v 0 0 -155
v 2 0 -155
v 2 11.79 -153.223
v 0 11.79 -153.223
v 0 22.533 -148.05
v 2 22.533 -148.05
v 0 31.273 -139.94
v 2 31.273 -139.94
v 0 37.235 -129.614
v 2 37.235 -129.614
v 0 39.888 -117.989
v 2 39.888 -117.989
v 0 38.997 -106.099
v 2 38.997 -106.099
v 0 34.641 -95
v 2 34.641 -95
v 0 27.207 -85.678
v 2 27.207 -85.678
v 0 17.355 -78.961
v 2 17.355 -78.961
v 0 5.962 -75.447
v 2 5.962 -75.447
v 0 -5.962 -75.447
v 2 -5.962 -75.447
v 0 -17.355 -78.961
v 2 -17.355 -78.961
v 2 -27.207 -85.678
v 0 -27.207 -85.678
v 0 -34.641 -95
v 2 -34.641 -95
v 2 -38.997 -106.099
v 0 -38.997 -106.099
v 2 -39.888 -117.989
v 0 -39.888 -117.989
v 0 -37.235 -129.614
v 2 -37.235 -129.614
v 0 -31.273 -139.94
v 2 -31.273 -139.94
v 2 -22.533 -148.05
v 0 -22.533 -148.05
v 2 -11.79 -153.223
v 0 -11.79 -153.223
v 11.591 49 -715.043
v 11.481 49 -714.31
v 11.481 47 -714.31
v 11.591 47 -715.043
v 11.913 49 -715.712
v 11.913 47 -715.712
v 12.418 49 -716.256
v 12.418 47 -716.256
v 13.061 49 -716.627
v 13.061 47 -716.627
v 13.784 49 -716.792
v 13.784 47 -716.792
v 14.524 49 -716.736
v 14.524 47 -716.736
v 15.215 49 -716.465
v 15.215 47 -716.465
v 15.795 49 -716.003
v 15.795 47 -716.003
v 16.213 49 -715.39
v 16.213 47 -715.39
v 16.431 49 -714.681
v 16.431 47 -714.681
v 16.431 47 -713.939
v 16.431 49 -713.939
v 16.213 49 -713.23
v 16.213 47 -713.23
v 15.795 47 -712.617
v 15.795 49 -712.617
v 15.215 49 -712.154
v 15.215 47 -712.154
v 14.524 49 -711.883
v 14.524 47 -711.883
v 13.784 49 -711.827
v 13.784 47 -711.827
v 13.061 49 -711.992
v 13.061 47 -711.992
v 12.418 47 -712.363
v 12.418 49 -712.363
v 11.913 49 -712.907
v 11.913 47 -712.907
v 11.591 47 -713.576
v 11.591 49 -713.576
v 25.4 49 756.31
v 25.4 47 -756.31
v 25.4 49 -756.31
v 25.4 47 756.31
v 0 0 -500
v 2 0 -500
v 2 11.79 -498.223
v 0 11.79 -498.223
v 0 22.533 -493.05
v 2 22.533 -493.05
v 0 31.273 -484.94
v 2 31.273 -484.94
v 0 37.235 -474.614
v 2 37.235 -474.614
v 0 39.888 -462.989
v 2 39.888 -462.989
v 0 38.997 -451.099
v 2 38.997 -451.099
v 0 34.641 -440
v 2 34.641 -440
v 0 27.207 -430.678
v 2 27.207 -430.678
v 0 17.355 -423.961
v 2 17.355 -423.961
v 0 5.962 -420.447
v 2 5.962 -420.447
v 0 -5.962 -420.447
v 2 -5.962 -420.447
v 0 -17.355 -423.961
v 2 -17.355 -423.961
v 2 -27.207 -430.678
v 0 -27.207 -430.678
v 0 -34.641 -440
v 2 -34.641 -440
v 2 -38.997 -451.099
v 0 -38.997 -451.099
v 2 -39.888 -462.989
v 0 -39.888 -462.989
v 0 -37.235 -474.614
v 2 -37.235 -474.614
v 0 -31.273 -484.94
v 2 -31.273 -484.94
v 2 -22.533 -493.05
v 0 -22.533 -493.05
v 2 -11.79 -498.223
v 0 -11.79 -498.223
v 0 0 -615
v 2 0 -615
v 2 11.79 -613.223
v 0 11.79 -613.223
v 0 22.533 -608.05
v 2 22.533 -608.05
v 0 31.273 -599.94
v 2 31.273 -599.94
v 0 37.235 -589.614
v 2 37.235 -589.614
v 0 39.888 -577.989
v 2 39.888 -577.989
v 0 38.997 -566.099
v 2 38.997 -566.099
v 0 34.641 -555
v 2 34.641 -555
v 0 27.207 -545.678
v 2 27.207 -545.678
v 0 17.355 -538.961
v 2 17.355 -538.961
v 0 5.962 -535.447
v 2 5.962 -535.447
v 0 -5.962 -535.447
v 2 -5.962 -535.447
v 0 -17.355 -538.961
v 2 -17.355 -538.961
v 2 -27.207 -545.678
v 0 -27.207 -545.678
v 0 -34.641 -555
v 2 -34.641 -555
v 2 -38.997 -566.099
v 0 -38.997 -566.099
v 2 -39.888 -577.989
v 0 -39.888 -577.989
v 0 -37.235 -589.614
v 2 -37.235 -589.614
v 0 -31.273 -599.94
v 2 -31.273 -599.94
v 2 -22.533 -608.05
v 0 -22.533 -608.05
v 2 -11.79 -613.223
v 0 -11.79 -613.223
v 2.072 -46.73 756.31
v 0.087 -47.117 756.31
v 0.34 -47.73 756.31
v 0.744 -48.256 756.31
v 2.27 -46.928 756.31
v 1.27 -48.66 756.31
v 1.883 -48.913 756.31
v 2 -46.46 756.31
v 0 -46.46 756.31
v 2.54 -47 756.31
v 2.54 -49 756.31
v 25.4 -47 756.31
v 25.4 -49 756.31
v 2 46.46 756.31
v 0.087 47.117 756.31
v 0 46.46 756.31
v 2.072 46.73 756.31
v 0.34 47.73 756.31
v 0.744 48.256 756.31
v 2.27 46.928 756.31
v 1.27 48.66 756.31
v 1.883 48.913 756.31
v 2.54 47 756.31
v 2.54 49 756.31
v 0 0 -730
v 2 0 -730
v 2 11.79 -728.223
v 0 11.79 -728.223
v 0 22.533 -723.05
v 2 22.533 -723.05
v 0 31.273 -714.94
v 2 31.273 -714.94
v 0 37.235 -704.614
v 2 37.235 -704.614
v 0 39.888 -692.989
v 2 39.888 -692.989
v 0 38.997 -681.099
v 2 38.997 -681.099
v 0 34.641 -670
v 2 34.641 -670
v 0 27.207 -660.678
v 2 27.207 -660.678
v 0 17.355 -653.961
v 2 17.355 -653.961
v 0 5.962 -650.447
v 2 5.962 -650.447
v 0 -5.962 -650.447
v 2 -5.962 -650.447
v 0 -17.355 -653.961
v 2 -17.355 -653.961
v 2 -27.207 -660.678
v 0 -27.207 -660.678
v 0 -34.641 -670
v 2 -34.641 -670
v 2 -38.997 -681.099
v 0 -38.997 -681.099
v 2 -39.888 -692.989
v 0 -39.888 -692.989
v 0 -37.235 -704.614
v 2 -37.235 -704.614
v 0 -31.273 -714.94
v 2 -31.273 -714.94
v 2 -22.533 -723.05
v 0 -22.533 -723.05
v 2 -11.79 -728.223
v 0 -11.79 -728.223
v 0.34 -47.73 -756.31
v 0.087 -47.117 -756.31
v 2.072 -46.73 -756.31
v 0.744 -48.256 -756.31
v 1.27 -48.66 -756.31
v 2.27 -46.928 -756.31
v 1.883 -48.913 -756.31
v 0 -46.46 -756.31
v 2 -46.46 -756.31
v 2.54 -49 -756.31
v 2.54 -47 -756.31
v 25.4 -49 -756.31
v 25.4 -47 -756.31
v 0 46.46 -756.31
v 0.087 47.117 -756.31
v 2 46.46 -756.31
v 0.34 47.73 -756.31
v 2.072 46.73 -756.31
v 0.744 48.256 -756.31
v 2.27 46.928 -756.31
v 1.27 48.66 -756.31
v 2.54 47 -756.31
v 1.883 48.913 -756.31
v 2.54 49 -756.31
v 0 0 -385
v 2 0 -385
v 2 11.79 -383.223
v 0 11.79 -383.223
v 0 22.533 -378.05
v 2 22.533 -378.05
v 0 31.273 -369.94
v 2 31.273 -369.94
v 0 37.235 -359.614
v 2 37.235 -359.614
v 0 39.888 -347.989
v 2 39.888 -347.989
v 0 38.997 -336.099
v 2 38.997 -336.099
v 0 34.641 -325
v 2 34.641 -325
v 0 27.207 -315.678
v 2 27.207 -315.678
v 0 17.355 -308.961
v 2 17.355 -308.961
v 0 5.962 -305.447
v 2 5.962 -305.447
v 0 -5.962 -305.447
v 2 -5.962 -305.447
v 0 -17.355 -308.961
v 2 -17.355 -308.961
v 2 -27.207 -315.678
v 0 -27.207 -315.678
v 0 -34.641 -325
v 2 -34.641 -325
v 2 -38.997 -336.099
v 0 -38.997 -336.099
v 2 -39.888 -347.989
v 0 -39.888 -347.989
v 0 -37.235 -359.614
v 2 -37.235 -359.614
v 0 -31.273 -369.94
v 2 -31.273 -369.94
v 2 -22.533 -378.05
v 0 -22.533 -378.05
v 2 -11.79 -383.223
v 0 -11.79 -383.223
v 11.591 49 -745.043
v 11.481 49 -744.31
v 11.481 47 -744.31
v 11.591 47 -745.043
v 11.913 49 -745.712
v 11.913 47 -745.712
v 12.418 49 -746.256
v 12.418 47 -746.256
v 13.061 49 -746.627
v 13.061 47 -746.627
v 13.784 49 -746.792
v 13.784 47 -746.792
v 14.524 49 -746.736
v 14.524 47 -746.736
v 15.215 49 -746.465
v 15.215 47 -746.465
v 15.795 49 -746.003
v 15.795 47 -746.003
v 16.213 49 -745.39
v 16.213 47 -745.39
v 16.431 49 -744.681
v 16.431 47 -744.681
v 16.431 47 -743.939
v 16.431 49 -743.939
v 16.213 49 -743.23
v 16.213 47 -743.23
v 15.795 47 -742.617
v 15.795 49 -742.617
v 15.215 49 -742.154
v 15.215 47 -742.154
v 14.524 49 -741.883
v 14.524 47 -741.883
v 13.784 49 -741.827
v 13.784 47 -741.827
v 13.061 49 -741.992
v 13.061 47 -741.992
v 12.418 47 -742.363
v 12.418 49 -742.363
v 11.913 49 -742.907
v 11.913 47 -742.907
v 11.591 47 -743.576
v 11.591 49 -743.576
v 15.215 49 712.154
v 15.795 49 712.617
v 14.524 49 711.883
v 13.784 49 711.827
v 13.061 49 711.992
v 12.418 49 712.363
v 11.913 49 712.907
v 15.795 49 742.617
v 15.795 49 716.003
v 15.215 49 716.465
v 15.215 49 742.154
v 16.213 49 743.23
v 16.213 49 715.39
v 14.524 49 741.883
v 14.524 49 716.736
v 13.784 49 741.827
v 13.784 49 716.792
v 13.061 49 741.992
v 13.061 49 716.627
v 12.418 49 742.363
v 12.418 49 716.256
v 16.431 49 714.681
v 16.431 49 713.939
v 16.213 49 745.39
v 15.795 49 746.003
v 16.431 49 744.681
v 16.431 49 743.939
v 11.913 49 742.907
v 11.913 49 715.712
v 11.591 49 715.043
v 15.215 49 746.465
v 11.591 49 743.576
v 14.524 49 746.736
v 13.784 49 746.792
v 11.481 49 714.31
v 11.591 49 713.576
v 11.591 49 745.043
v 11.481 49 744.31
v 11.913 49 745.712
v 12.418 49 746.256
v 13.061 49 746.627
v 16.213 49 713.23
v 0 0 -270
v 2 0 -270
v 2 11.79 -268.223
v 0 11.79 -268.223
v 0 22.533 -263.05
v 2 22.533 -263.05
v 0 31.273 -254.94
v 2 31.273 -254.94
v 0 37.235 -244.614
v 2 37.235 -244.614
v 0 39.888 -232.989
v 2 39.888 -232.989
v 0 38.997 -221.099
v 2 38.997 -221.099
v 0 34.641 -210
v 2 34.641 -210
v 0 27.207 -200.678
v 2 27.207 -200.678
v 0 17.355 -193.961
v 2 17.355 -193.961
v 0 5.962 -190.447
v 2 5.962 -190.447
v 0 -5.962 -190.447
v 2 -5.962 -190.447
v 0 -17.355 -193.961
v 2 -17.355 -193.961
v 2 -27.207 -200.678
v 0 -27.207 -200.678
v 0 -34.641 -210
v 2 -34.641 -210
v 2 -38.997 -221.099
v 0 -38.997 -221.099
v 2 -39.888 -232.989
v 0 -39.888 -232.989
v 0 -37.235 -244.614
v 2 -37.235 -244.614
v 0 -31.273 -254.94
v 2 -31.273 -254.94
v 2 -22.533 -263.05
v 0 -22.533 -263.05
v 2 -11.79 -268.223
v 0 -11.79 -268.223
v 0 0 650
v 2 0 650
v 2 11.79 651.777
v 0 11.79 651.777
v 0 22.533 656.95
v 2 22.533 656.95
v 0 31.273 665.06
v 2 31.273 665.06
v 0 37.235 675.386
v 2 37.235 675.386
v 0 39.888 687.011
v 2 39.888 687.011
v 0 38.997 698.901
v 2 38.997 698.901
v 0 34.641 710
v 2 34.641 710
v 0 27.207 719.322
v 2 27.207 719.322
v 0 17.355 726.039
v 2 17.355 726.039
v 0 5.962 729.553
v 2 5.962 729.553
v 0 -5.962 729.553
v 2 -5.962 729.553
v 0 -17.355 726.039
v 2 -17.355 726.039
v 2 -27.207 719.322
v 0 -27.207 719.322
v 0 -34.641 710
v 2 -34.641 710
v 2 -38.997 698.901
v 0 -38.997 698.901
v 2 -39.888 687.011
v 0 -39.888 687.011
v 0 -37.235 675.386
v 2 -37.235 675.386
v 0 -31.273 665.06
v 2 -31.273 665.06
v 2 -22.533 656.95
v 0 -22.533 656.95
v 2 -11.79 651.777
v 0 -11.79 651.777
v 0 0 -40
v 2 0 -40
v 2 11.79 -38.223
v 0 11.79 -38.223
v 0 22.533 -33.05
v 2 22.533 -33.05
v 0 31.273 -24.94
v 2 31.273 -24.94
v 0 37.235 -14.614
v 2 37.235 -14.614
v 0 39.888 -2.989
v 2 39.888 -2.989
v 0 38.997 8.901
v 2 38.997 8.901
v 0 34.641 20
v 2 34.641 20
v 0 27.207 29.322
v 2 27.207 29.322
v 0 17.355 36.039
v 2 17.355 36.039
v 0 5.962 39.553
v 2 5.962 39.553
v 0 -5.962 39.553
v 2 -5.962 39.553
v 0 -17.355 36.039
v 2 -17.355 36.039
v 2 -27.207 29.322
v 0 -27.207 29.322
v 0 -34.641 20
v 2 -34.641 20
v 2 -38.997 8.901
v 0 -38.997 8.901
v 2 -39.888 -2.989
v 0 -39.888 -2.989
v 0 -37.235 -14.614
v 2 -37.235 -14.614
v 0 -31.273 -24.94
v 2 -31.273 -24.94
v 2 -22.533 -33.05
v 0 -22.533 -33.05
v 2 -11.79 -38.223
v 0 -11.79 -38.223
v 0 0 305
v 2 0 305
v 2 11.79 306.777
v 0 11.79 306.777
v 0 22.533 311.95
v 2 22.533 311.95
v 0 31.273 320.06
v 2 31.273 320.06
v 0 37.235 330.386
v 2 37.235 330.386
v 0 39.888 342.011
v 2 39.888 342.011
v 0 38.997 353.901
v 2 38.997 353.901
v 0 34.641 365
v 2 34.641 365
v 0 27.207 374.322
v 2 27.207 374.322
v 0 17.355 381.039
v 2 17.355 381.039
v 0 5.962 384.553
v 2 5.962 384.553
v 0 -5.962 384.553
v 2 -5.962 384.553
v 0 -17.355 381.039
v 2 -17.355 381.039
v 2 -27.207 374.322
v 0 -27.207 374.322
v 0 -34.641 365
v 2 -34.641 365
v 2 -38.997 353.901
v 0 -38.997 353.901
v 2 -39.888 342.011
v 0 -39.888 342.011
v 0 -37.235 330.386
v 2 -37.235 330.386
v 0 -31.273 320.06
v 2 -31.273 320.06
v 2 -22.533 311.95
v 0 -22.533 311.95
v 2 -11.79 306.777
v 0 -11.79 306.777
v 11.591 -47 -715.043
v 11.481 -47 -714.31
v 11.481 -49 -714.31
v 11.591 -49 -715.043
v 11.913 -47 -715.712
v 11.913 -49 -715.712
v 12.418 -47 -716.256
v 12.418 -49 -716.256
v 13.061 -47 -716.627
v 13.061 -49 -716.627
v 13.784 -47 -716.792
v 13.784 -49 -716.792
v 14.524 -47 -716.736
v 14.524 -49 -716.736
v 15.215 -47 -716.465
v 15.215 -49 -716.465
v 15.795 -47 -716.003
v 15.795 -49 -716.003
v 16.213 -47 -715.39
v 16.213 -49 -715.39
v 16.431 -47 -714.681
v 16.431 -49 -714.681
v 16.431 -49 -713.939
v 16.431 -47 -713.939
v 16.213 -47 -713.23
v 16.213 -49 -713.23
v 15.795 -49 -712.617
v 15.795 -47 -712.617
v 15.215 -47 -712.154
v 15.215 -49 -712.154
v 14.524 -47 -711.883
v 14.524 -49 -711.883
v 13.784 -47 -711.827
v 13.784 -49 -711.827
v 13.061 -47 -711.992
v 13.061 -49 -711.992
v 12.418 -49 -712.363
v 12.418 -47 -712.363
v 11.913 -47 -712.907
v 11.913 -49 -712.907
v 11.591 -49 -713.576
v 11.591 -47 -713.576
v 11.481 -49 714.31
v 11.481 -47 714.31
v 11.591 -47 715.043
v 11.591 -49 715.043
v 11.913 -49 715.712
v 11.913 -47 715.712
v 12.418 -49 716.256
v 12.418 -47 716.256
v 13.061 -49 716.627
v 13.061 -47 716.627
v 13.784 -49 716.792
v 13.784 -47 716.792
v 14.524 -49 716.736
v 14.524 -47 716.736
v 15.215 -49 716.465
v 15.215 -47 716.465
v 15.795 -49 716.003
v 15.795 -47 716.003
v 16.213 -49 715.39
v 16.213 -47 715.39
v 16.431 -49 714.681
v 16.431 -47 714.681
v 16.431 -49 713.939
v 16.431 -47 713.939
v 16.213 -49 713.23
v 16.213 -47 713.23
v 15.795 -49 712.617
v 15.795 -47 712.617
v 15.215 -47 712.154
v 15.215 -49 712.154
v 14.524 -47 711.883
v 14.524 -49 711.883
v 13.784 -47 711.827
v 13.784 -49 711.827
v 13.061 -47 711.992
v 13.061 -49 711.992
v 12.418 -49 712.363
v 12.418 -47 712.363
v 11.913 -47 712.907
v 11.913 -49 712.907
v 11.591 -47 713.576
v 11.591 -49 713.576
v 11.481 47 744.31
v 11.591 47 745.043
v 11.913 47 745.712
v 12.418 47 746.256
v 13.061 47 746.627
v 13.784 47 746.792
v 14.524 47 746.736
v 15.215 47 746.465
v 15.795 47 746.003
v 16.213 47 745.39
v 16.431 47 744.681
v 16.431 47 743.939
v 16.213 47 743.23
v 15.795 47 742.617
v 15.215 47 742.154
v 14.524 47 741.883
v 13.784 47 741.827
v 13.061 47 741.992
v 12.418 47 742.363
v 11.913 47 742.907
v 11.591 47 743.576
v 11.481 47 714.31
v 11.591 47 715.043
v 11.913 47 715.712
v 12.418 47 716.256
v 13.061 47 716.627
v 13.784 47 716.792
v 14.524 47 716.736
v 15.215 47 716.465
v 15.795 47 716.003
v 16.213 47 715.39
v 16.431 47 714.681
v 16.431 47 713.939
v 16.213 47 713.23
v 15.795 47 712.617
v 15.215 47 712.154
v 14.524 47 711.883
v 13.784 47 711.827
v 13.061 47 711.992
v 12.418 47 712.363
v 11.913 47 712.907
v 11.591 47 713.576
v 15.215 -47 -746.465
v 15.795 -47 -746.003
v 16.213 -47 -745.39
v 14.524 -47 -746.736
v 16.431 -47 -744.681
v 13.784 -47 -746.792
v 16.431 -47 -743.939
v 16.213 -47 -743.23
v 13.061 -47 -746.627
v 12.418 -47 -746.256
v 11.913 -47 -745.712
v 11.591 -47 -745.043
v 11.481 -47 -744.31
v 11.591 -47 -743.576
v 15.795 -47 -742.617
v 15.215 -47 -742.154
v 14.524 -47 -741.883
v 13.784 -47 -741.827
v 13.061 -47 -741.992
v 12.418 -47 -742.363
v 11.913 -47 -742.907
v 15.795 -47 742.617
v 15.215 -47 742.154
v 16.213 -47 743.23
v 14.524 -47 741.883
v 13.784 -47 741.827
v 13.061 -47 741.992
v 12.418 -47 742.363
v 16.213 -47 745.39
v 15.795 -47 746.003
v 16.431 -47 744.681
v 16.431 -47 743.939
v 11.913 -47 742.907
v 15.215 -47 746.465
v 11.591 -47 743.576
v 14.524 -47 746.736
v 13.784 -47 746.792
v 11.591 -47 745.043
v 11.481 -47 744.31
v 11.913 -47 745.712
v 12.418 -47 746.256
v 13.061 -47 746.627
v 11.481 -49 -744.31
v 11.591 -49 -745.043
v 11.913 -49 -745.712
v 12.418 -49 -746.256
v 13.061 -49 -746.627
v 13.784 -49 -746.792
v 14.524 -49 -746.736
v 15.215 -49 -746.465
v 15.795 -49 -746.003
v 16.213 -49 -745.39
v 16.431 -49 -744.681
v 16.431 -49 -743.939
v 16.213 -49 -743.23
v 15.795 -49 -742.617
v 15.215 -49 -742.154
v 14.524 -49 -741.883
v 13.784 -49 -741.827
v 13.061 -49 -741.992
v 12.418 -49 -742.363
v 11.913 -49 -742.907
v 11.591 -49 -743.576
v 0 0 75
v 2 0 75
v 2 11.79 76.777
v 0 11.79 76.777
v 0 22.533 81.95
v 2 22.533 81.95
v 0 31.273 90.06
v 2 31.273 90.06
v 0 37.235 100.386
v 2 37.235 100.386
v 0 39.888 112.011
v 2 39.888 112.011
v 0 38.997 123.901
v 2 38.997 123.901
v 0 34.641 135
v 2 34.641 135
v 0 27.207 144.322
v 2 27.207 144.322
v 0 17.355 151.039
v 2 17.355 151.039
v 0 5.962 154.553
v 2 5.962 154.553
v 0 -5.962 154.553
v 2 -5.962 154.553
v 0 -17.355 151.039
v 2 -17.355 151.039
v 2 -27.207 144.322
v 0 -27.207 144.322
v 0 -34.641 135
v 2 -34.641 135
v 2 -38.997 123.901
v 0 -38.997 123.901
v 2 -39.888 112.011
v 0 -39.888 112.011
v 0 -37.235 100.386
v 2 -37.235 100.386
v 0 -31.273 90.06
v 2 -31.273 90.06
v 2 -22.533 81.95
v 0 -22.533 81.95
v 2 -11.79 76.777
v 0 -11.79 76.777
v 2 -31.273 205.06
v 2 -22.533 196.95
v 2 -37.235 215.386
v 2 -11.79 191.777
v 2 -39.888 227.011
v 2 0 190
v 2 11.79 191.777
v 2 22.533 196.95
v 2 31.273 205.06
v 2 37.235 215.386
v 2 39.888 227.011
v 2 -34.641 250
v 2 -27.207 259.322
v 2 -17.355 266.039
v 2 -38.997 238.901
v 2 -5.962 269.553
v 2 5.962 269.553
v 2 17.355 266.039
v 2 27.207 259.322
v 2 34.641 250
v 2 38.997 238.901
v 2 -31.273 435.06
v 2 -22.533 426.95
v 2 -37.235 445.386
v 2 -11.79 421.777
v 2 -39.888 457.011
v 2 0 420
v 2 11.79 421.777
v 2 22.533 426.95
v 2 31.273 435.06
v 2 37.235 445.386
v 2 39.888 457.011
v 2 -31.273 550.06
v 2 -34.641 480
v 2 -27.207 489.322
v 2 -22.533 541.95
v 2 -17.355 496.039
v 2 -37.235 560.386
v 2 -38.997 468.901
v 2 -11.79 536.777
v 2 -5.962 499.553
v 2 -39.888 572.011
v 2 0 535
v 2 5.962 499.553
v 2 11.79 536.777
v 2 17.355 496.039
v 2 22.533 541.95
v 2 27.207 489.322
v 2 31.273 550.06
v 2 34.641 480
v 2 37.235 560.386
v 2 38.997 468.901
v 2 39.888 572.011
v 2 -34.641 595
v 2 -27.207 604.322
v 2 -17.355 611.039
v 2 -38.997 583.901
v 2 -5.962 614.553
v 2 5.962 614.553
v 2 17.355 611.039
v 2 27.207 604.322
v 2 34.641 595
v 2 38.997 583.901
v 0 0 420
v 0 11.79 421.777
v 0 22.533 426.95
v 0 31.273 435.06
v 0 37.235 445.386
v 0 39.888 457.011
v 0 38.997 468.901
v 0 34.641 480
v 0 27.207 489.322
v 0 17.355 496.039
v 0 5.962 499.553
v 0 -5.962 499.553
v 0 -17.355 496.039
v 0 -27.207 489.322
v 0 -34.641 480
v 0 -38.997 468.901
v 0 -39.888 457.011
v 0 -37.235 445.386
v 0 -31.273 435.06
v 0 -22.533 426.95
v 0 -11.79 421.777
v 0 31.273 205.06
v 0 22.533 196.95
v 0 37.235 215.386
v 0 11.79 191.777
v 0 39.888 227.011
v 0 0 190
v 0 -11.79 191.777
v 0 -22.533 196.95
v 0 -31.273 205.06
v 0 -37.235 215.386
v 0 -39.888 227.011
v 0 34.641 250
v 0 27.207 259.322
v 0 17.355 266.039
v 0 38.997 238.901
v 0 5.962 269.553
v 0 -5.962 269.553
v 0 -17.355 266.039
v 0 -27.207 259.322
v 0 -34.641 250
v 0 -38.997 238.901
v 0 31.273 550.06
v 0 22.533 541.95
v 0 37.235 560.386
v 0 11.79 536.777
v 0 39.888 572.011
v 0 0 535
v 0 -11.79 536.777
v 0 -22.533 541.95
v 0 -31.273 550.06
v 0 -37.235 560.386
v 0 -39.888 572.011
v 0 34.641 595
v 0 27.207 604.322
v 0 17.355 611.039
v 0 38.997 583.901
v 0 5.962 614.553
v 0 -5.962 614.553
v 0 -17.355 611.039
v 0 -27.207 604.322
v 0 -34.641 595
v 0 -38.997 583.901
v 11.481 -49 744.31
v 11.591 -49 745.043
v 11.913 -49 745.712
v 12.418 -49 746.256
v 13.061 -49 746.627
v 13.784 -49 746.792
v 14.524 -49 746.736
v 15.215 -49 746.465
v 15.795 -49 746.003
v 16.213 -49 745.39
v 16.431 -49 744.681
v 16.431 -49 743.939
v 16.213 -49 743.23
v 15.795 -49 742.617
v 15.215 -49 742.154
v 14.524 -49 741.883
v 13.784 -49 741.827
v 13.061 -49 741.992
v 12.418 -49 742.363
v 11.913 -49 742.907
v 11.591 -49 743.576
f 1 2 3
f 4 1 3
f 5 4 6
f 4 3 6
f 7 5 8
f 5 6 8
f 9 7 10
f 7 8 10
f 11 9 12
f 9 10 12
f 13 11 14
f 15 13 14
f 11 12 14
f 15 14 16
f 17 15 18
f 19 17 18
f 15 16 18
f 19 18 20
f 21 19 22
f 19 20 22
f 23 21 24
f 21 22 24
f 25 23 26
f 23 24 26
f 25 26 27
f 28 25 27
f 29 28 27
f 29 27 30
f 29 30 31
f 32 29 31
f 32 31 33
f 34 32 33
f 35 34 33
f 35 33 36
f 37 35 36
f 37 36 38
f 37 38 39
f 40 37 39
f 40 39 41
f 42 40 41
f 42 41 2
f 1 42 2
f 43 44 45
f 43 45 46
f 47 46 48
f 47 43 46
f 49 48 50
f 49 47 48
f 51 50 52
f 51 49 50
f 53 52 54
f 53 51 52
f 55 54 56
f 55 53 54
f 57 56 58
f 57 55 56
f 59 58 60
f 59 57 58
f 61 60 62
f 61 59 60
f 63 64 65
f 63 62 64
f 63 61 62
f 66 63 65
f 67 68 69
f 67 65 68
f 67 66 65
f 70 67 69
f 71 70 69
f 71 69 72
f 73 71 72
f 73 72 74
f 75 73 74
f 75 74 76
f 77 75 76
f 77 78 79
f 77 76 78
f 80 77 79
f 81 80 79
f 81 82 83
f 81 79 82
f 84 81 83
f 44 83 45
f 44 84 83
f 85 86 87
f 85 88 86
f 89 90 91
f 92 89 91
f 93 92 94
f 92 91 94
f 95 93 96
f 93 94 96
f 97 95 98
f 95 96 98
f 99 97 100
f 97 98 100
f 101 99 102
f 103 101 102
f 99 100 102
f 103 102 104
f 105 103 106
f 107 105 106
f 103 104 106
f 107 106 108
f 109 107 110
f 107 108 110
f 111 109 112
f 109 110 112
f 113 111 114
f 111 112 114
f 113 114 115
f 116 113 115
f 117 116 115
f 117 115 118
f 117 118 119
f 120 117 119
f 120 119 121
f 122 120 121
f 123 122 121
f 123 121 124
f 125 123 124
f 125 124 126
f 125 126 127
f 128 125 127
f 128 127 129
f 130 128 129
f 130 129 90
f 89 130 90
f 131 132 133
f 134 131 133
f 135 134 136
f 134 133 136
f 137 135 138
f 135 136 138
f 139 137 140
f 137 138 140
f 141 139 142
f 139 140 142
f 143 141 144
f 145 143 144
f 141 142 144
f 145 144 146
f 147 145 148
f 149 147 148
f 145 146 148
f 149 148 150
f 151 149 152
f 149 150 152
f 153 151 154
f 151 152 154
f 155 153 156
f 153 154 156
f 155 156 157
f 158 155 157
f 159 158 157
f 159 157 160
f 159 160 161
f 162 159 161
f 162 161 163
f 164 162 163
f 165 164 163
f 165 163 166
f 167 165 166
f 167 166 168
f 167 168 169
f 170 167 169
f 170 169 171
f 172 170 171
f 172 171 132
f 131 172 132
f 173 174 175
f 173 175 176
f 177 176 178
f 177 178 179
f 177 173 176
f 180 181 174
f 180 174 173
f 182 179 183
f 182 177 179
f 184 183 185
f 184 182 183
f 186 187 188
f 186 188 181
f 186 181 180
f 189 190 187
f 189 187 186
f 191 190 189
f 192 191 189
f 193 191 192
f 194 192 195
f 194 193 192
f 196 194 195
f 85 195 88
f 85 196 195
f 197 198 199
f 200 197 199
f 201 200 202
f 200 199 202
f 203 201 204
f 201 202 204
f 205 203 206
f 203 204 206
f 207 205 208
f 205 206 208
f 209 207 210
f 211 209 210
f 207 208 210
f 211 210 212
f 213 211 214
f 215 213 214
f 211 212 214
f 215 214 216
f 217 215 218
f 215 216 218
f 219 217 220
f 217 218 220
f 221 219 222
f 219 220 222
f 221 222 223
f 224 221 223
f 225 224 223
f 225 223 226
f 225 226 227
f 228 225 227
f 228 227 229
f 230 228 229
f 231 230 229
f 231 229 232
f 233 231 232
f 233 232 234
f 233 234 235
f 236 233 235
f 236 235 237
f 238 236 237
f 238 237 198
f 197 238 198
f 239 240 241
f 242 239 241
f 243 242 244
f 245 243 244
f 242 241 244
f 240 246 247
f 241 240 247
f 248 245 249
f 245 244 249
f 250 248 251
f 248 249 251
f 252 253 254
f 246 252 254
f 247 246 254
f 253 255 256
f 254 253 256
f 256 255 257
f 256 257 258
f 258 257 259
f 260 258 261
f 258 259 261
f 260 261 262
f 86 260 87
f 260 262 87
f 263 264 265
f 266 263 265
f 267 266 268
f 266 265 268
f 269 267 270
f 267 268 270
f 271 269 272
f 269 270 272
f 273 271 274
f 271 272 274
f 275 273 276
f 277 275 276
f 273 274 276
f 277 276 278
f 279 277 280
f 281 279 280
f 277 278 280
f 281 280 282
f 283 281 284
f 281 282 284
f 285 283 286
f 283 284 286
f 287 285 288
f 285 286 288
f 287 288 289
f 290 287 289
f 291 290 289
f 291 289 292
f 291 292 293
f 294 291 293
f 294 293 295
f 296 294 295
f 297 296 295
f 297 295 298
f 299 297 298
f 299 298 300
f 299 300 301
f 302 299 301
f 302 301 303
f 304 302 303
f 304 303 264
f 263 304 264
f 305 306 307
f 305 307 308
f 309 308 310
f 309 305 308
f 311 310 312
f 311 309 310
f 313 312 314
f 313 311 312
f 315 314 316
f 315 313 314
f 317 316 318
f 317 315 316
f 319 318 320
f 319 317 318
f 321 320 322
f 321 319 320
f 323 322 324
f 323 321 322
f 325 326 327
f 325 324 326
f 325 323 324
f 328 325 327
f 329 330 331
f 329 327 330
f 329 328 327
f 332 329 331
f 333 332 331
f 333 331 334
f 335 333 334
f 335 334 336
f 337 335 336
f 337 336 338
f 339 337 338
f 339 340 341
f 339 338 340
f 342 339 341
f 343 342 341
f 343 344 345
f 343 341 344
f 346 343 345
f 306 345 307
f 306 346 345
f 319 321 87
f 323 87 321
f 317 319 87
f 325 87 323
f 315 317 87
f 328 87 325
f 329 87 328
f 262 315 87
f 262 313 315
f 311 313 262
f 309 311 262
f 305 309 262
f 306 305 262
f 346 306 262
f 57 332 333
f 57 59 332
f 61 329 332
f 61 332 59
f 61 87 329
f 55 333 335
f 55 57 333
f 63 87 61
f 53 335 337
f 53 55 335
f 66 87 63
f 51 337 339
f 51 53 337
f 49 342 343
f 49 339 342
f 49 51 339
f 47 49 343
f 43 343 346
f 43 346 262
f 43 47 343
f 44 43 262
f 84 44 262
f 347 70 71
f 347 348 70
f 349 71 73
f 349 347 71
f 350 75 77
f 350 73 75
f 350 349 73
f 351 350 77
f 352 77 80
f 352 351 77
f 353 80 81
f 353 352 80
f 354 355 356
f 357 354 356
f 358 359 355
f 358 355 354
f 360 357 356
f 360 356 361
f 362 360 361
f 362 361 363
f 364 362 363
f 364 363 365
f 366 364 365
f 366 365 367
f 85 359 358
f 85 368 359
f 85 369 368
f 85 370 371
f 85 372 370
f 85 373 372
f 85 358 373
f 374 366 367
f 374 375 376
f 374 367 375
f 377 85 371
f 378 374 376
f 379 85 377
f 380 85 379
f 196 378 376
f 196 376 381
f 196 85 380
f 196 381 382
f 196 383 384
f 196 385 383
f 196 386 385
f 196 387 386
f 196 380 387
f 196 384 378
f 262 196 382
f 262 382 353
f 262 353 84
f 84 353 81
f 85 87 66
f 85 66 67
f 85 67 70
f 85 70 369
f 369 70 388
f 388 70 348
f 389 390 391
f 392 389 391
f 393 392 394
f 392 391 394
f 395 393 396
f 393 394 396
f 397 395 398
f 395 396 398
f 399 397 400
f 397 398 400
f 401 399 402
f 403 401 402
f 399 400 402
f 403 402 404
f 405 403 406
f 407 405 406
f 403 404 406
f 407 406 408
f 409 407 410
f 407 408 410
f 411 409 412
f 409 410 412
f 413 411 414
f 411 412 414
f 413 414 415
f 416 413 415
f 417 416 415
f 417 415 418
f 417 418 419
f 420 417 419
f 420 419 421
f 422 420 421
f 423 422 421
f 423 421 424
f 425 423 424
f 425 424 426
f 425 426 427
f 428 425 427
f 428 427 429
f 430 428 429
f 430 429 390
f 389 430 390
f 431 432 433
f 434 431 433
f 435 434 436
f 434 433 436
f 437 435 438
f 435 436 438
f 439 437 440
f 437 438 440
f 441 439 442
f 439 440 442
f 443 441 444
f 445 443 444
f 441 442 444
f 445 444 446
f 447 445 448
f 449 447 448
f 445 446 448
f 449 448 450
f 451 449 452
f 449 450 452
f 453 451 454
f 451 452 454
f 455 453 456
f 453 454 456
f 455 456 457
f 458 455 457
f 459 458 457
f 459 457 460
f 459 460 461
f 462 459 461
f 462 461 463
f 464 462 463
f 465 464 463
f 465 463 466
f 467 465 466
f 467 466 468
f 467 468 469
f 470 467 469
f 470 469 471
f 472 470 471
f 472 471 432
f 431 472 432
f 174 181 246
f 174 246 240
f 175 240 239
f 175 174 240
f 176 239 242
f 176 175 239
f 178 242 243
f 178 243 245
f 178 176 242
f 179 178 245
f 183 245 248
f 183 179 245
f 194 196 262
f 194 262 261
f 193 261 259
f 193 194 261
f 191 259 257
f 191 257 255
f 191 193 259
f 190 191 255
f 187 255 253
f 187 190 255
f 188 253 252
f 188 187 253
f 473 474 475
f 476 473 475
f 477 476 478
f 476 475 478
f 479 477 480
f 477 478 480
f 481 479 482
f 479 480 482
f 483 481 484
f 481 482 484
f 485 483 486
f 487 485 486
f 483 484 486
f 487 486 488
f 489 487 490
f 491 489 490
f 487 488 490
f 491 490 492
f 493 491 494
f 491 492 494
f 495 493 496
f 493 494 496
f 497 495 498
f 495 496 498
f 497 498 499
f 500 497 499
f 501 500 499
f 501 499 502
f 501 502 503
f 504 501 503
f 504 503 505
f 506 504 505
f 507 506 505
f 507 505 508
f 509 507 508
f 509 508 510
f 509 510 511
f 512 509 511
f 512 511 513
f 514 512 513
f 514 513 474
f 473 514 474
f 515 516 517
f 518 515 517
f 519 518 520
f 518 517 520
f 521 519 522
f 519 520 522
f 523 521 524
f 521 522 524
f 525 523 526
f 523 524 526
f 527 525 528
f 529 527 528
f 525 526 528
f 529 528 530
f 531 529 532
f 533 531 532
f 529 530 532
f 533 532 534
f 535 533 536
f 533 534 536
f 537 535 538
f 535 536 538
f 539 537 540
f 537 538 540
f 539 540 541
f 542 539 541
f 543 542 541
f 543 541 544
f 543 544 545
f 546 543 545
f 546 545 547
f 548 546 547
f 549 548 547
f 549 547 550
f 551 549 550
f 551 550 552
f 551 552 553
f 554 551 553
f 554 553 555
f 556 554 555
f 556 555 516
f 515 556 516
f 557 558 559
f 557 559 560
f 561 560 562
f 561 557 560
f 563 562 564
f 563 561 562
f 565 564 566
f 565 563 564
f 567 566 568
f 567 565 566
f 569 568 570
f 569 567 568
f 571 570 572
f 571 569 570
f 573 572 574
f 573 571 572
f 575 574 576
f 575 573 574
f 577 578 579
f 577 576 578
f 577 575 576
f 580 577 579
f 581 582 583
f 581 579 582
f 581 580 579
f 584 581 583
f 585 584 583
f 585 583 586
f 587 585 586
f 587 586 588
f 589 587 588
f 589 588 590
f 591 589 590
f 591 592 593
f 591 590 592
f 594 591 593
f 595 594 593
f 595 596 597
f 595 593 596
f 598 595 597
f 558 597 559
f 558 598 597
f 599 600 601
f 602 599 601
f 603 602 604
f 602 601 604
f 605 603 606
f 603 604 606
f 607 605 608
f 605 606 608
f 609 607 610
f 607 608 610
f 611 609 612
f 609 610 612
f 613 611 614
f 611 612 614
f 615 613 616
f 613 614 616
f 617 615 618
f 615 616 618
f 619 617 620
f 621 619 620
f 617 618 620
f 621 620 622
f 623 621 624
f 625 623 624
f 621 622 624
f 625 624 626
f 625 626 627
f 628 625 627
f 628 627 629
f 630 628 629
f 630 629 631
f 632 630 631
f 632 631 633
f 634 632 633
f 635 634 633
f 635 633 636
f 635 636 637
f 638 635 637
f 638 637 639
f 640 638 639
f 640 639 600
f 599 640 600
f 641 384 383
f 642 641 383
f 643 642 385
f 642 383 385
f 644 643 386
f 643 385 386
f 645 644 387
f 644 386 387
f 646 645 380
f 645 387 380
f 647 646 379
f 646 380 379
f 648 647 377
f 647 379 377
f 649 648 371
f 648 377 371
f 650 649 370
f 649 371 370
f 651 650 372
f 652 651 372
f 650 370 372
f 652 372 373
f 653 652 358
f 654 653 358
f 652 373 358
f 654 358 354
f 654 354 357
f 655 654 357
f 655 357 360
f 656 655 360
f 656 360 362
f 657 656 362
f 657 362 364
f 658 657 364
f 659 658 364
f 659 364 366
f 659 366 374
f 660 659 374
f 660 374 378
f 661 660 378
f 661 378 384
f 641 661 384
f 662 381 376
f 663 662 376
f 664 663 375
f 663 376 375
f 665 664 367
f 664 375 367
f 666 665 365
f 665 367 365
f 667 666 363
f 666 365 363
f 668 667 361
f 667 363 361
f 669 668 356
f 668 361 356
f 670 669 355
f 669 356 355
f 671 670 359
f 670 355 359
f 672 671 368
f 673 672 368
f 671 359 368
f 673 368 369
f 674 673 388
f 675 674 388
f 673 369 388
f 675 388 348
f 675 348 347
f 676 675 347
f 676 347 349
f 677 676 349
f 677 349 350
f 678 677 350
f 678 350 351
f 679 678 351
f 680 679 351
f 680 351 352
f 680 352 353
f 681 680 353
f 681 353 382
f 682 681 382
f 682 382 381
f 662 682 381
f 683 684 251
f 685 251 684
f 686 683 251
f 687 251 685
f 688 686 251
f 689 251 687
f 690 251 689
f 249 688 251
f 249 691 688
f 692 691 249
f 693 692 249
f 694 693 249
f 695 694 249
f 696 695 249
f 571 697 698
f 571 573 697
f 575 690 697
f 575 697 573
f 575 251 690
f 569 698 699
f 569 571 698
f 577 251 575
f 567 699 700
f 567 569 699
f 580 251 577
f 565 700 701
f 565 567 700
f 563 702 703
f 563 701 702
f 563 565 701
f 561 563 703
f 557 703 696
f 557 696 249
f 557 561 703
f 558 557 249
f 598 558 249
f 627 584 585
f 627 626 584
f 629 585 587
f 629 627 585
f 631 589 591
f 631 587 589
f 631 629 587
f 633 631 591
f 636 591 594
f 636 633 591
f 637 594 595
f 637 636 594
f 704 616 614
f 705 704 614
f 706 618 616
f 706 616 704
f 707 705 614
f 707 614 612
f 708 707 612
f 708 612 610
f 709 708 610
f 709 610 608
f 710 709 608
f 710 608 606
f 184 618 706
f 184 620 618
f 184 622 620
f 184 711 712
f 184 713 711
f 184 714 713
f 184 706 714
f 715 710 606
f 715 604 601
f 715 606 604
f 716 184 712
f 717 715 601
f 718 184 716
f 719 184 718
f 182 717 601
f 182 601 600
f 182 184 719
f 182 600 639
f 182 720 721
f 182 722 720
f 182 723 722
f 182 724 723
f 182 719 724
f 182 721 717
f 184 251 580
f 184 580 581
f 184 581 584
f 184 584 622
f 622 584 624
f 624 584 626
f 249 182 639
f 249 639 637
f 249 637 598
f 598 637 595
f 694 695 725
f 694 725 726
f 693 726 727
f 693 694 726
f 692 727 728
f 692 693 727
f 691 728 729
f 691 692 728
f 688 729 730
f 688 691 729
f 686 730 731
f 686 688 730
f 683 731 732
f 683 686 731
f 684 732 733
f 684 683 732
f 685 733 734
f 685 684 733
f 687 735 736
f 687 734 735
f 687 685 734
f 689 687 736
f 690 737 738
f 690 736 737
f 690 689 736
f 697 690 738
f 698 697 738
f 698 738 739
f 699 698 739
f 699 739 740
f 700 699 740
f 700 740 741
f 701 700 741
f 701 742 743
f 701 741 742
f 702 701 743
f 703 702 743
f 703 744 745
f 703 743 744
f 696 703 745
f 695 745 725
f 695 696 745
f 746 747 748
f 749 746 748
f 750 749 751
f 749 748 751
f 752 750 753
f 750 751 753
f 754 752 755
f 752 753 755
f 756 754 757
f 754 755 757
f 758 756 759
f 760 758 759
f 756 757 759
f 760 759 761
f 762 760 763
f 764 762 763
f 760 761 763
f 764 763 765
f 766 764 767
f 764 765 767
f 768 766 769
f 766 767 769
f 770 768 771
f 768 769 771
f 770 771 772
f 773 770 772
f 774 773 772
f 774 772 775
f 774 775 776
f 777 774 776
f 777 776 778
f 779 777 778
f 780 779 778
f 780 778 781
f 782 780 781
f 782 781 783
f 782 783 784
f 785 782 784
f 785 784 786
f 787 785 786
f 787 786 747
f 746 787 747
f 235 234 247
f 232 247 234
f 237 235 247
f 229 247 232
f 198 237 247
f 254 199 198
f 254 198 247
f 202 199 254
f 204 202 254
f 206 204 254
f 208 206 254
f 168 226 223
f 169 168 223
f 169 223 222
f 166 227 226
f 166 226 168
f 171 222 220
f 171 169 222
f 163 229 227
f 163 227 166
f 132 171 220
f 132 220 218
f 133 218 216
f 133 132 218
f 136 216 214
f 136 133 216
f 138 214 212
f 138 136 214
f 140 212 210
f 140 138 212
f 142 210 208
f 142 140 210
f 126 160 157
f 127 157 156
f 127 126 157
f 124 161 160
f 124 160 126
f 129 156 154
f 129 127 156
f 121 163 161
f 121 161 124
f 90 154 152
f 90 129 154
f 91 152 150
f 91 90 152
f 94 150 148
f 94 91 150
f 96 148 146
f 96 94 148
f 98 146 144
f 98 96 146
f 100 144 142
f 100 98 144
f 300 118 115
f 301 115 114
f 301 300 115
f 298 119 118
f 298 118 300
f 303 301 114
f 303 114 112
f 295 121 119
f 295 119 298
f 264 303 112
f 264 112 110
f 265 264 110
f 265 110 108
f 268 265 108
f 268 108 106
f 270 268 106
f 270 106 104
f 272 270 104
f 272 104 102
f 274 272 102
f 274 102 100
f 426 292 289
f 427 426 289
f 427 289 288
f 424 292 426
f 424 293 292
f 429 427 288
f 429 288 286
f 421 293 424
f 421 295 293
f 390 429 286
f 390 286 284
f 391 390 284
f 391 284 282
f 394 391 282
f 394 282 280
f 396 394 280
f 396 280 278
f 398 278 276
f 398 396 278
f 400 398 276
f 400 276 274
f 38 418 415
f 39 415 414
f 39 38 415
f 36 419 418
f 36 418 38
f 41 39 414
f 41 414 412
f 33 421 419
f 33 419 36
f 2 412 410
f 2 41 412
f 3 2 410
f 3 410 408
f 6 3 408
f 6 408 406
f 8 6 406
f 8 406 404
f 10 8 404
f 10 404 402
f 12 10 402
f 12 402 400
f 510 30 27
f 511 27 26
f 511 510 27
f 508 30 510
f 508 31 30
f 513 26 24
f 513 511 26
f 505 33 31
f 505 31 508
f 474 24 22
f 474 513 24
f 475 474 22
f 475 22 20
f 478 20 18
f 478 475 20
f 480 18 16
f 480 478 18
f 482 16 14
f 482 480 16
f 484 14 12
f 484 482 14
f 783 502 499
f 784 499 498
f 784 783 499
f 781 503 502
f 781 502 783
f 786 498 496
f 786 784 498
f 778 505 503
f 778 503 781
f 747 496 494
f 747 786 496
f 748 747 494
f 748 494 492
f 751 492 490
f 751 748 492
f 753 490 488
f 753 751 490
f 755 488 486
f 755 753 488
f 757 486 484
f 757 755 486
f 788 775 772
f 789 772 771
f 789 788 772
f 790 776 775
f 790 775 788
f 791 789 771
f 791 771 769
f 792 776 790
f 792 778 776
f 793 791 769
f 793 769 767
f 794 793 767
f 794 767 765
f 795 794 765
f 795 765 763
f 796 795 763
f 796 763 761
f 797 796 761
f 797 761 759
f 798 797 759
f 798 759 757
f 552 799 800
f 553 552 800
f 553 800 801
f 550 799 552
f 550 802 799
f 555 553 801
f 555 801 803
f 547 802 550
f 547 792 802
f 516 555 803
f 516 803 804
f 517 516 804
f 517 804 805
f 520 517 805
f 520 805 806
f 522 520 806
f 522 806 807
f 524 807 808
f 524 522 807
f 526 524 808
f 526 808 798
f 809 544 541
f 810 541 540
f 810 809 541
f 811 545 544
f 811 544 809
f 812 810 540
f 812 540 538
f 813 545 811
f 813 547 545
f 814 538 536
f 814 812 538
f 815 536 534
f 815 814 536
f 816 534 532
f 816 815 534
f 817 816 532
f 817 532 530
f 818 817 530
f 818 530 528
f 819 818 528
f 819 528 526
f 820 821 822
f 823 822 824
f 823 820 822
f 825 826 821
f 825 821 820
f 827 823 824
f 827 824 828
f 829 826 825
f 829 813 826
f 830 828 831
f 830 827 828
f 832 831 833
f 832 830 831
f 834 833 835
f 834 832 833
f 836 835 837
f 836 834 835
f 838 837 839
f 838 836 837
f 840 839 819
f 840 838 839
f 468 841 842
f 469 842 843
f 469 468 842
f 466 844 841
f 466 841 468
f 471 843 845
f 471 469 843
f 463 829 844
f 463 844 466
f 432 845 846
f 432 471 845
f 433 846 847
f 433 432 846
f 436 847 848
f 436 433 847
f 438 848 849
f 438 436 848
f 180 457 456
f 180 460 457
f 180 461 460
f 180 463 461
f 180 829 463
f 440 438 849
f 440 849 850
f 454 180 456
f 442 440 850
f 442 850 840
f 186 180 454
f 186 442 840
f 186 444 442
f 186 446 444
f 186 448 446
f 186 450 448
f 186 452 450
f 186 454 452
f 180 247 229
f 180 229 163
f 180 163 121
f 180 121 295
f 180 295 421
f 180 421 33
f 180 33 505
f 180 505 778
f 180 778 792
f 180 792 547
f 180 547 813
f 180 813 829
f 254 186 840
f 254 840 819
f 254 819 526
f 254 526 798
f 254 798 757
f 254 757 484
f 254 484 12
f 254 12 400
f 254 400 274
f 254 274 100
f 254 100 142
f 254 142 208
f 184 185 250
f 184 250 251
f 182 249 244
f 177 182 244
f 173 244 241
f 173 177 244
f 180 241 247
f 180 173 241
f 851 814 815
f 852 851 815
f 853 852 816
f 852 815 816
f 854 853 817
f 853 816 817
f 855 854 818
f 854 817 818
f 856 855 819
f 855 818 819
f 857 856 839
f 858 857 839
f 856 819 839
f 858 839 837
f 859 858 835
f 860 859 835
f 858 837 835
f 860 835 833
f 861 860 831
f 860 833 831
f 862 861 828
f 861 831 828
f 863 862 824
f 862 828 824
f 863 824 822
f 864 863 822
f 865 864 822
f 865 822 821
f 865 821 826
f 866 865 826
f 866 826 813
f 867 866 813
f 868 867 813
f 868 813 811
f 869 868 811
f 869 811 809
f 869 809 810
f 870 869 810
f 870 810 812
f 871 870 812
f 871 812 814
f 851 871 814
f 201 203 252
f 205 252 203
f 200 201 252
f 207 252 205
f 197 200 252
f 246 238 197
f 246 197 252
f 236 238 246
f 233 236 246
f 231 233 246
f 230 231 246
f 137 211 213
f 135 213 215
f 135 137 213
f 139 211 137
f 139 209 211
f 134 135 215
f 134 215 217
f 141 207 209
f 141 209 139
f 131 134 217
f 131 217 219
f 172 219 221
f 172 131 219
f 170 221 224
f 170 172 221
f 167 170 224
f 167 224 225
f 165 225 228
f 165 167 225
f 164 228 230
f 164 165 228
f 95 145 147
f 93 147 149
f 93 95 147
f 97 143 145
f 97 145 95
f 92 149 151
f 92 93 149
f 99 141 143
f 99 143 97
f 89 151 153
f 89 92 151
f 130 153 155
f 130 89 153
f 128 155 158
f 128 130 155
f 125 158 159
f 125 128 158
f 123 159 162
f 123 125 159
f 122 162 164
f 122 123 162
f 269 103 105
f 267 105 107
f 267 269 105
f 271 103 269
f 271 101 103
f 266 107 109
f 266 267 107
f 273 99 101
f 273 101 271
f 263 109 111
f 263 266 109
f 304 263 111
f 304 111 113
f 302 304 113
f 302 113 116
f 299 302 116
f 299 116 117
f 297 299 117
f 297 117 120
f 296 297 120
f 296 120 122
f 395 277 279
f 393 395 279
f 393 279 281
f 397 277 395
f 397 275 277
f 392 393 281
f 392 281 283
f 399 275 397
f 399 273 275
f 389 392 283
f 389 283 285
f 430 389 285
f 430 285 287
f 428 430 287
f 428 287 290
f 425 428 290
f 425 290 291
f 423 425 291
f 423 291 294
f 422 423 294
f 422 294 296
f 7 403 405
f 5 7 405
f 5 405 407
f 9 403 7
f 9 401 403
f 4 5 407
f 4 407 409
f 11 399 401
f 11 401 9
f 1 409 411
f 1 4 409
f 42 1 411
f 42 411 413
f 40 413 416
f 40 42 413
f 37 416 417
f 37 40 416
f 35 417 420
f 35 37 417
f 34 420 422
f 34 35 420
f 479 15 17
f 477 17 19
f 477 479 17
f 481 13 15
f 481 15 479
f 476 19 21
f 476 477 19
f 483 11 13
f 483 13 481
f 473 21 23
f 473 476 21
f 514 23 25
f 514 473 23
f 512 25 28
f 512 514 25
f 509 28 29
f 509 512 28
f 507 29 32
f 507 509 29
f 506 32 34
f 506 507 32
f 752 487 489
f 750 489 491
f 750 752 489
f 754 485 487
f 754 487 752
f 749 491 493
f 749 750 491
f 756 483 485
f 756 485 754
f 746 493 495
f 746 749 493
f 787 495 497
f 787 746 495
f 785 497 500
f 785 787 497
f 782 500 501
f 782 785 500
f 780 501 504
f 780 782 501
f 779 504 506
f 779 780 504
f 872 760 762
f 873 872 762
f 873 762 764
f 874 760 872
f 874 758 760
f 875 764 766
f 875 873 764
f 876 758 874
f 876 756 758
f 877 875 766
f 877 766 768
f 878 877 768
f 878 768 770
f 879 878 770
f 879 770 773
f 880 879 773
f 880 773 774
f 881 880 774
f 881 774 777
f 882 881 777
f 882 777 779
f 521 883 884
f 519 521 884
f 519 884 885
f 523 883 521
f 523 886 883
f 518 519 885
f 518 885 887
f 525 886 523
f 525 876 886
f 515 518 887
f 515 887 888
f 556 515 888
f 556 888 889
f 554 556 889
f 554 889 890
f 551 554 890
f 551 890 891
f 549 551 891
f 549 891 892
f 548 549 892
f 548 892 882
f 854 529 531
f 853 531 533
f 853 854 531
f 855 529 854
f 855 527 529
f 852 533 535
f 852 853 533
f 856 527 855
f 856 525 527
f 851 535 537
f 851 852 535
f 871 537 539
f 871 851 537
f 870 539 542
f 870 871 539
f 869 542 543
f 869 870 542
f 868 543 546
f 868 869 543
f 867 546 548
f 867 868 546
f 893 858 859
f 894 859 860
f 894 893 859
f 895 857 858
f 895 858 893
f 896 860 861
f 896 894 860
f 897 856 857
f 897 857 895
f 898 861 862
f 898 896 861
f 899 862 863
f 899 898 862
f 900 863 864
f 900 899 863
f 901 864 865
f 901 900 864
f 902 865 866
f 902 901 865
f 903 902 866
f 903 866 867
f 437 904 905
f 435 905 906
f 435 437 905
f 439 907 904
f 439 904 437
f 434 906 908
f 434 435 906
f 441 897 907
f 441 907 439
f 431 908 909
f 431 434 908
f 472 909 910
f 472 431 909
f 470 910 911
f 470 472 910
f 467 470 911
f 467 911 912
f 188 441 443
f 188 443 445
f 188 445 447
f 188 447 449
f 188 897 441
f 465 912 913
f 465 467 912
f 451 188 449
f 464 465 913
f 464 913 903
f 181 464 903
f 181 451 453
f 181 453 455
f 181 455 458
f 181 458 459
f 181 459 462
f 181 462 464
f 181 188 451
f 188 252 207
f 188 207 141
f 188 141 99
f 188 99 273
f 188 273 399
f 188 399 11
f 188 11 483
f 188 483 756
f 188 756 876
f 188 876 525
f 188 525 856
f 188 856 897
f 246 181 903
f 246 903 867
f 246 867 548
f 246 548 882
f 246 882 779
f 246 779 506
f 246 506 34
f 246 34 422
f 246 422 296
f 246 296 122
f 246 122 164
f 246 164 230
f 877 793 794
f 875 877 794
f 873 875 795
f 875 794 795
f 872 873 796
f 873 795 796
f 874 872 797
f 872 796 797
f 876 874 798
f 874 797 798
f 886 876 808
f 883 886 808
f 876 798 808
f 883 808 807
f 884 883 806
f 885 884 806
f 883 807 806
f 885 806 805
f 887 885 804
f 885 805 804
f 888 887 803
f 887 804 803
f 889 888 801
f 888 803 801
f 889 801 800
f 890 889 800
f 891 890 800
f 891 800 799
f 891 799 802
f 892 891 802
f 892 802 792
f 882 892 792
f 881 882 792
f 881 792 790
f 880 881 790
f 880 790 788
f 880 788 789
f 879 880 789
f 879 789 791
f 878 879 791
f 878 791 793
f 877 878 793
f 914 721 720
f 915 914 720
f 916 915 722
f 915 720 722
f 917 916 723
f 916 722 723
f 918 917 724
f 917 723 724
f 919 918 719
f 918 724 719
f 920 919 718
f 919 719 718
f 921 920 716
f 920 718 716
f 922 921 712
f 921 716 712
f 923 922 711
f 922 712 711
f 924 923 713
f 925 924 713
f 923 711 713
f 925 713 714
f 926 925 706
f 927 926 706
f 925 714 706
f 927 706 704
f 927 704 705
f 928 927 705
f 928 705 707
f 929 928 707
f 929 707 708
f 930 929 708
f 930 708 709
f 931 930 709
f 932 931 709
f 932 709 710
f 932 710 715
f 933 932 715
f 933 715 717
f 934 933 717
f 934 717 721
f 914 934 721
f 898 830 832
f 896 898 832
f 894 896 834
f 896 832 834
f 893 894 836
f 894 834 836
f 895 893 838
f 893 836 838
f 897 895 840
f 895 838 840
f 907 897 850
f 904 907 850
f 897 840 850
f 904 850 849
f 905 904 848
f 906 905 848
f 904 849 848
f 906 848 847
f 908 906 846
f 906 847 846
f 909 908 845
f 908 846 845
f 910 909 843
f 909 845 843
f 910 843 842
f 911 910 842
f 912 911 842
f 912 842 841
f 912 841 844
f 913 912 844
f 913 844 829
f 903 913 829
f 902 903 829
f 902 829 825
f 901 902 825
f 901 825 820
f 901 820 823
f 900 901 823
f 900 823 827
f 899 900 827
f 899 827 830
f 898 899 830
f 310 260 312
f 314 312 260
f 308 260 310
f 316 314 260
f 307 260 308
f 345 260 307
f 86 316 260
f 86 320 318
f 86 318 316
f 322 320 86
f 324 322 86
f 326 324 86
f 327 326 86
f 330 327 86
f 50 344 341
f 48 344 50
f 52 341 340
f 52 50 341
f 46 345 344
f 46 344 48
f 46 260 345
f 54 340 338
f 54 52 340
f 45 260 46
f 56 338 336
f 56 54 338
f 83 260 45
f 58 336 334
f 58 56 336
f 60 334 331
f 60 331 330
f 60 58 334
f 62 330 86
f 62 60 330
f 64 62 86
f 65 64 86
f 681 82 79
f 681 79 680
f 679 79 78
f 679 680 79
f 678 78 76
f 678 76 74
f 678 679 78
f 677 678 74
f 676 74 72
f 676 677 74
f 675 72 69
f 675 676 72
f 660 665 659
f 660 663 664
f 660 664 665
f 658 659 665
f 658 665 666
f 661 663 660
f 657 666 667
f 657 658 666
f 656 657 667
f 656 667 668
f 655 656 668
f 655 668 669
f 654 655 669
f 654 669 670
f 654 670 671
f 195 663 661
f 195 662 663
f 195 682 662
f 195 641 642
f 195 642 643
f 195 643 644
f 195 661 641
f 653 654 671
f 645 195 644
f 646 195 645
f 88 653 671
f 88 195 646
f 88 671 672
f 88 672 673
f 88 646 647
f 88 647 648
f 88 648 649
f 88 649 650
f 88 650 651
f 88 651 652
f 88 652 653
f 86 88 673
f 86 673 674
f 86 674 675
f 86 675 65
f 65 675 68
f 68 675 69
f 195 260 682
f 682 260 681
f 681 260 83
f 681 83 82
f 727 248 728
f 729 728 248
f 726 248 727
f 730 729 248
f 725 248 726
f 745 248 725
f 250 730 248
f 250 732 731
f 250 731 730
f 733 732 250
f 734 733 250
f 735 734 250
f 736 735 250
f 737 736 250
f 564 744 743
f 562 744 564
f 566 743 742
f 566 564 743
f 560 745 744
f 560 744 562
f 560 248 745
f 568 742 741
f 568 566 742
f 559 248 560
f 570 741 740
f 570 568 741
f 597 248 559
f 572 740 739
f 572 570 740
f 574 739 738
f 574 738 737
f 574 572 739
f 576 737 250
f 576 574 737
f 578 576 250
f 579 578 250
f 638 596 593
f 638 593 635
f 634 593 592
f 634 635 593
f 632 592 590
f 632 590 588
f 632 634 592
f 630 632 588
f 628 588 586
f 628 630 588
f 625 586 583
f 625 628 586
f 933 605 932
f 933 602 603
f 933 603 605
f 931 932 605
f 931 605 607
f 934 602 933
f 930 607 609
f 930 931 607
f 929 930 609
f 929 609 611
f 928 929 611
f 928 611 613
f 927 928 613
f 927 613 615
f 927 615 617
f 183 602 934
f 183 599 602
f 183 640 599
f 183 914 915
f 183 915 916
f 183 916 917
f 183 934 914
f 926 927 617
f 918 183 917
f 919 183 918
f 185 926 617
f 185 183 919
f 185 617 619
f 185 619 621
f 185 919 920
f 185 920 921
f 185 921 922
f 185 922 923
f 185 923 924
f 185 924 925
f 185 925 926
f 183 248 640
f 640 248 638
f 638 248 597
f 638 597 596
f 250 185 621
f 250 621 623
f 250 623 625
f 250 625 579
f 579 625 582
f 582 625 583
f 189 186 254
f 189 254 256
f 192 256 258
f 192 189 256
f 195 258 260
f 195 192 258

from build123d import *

# Parameters (mm, degrees)
EXTRUDE_THIN1_DEPTH    = 756.30962295
SKETCH2_R              = 40
EXTRUDE1_DEPTH         = 3
LPATTERN1_COUNT        = 7
LPATTERN1_PITCH        = 115
LPATTERN2_COUNT        = 7
LPATTERN2_PITCH        = 115
F_10_CLEARANCE_HOLE1_D = 4.9784


with BuildPart() as part:
    # Sketch1 → Extrude-Thin1 (new body, symmetric)
    with BuildSketch(Plane.XY):
        with BuildLine():
            Line((25.4, 49), (2.54, 49))
            ThreePointArc((2.54, 49), (0.743948776, 48.256051224), (0, 46.46))
            Line((0, 46.46), (0, -46.46))
            ThreePointArc((0, -46.46), (0.743948776, -48.256051224), (2.54, -49))
            Line((2.54, -49), (25.4, -49))
            Line((25.4, -49), (25.4, -47))
            Line((25.4, -47), (2.54, -47))
            ThreePointArc((2.54, -47), (2.158162338, -46.841837662), (2, -46.46))
            Line((2, -46.46), (2, 46.46))
            ThreePointArc((2, 46.46), (2.158162338, 46.841837662), (2.54, 47))
            Line((2.54, 47), (25.4, 47))
            Line((25.4, 47), (25.4, 49))
        make_face()
    extrude(amount=EXTRUDE_THIN1_DEPTH, both=True)

    # Sketch2 → Extrude1 (cut, through all)
    with BuildSketch(Plane(origin=(2, 0, 0), x_dir=(0, 0, -1), z_dir=(1, 0, 0))):
        Circle(SKETCH2_R)
    extrude1 = extrude(amount=-EXTRUDE1_DEPTH, mode=Mode.SUBTRACT)

    # LPattern1: Extrude1 ×7
    with Locations(*[(0, 0, i * LPATTERN1_PITCH) for i in range(1, LPATTERN1_COUNT)]):
        add(extrude1, mode=Mode.SUBTRACT)

    # LPattern2: Extrude1 ×7
    with Locations(*[(0, 0, -i * LPATTERN2_PITCH) for i in range(1, LPATTERN2_COUNT)]):
        add(extrude1, mode=Mode.SUBTRACT)

    # #10 Clearance Hole1 (through all)
    with Locations(Plane.XZ.offset(49)):
        with Locations((13.97, 744.30962295), (13.97, 714.30962295)):
            f_10_clearance_hole1 = Hole(F_10_CLEARANCE_HOLE1_D / 2)

    # Mirror1: #10 Clearance Hole1 across plane
    add(f_10_clearance_hole1.mirror(Plane.XY), mode=Mode.SUBTRACT)


solid = part.part
